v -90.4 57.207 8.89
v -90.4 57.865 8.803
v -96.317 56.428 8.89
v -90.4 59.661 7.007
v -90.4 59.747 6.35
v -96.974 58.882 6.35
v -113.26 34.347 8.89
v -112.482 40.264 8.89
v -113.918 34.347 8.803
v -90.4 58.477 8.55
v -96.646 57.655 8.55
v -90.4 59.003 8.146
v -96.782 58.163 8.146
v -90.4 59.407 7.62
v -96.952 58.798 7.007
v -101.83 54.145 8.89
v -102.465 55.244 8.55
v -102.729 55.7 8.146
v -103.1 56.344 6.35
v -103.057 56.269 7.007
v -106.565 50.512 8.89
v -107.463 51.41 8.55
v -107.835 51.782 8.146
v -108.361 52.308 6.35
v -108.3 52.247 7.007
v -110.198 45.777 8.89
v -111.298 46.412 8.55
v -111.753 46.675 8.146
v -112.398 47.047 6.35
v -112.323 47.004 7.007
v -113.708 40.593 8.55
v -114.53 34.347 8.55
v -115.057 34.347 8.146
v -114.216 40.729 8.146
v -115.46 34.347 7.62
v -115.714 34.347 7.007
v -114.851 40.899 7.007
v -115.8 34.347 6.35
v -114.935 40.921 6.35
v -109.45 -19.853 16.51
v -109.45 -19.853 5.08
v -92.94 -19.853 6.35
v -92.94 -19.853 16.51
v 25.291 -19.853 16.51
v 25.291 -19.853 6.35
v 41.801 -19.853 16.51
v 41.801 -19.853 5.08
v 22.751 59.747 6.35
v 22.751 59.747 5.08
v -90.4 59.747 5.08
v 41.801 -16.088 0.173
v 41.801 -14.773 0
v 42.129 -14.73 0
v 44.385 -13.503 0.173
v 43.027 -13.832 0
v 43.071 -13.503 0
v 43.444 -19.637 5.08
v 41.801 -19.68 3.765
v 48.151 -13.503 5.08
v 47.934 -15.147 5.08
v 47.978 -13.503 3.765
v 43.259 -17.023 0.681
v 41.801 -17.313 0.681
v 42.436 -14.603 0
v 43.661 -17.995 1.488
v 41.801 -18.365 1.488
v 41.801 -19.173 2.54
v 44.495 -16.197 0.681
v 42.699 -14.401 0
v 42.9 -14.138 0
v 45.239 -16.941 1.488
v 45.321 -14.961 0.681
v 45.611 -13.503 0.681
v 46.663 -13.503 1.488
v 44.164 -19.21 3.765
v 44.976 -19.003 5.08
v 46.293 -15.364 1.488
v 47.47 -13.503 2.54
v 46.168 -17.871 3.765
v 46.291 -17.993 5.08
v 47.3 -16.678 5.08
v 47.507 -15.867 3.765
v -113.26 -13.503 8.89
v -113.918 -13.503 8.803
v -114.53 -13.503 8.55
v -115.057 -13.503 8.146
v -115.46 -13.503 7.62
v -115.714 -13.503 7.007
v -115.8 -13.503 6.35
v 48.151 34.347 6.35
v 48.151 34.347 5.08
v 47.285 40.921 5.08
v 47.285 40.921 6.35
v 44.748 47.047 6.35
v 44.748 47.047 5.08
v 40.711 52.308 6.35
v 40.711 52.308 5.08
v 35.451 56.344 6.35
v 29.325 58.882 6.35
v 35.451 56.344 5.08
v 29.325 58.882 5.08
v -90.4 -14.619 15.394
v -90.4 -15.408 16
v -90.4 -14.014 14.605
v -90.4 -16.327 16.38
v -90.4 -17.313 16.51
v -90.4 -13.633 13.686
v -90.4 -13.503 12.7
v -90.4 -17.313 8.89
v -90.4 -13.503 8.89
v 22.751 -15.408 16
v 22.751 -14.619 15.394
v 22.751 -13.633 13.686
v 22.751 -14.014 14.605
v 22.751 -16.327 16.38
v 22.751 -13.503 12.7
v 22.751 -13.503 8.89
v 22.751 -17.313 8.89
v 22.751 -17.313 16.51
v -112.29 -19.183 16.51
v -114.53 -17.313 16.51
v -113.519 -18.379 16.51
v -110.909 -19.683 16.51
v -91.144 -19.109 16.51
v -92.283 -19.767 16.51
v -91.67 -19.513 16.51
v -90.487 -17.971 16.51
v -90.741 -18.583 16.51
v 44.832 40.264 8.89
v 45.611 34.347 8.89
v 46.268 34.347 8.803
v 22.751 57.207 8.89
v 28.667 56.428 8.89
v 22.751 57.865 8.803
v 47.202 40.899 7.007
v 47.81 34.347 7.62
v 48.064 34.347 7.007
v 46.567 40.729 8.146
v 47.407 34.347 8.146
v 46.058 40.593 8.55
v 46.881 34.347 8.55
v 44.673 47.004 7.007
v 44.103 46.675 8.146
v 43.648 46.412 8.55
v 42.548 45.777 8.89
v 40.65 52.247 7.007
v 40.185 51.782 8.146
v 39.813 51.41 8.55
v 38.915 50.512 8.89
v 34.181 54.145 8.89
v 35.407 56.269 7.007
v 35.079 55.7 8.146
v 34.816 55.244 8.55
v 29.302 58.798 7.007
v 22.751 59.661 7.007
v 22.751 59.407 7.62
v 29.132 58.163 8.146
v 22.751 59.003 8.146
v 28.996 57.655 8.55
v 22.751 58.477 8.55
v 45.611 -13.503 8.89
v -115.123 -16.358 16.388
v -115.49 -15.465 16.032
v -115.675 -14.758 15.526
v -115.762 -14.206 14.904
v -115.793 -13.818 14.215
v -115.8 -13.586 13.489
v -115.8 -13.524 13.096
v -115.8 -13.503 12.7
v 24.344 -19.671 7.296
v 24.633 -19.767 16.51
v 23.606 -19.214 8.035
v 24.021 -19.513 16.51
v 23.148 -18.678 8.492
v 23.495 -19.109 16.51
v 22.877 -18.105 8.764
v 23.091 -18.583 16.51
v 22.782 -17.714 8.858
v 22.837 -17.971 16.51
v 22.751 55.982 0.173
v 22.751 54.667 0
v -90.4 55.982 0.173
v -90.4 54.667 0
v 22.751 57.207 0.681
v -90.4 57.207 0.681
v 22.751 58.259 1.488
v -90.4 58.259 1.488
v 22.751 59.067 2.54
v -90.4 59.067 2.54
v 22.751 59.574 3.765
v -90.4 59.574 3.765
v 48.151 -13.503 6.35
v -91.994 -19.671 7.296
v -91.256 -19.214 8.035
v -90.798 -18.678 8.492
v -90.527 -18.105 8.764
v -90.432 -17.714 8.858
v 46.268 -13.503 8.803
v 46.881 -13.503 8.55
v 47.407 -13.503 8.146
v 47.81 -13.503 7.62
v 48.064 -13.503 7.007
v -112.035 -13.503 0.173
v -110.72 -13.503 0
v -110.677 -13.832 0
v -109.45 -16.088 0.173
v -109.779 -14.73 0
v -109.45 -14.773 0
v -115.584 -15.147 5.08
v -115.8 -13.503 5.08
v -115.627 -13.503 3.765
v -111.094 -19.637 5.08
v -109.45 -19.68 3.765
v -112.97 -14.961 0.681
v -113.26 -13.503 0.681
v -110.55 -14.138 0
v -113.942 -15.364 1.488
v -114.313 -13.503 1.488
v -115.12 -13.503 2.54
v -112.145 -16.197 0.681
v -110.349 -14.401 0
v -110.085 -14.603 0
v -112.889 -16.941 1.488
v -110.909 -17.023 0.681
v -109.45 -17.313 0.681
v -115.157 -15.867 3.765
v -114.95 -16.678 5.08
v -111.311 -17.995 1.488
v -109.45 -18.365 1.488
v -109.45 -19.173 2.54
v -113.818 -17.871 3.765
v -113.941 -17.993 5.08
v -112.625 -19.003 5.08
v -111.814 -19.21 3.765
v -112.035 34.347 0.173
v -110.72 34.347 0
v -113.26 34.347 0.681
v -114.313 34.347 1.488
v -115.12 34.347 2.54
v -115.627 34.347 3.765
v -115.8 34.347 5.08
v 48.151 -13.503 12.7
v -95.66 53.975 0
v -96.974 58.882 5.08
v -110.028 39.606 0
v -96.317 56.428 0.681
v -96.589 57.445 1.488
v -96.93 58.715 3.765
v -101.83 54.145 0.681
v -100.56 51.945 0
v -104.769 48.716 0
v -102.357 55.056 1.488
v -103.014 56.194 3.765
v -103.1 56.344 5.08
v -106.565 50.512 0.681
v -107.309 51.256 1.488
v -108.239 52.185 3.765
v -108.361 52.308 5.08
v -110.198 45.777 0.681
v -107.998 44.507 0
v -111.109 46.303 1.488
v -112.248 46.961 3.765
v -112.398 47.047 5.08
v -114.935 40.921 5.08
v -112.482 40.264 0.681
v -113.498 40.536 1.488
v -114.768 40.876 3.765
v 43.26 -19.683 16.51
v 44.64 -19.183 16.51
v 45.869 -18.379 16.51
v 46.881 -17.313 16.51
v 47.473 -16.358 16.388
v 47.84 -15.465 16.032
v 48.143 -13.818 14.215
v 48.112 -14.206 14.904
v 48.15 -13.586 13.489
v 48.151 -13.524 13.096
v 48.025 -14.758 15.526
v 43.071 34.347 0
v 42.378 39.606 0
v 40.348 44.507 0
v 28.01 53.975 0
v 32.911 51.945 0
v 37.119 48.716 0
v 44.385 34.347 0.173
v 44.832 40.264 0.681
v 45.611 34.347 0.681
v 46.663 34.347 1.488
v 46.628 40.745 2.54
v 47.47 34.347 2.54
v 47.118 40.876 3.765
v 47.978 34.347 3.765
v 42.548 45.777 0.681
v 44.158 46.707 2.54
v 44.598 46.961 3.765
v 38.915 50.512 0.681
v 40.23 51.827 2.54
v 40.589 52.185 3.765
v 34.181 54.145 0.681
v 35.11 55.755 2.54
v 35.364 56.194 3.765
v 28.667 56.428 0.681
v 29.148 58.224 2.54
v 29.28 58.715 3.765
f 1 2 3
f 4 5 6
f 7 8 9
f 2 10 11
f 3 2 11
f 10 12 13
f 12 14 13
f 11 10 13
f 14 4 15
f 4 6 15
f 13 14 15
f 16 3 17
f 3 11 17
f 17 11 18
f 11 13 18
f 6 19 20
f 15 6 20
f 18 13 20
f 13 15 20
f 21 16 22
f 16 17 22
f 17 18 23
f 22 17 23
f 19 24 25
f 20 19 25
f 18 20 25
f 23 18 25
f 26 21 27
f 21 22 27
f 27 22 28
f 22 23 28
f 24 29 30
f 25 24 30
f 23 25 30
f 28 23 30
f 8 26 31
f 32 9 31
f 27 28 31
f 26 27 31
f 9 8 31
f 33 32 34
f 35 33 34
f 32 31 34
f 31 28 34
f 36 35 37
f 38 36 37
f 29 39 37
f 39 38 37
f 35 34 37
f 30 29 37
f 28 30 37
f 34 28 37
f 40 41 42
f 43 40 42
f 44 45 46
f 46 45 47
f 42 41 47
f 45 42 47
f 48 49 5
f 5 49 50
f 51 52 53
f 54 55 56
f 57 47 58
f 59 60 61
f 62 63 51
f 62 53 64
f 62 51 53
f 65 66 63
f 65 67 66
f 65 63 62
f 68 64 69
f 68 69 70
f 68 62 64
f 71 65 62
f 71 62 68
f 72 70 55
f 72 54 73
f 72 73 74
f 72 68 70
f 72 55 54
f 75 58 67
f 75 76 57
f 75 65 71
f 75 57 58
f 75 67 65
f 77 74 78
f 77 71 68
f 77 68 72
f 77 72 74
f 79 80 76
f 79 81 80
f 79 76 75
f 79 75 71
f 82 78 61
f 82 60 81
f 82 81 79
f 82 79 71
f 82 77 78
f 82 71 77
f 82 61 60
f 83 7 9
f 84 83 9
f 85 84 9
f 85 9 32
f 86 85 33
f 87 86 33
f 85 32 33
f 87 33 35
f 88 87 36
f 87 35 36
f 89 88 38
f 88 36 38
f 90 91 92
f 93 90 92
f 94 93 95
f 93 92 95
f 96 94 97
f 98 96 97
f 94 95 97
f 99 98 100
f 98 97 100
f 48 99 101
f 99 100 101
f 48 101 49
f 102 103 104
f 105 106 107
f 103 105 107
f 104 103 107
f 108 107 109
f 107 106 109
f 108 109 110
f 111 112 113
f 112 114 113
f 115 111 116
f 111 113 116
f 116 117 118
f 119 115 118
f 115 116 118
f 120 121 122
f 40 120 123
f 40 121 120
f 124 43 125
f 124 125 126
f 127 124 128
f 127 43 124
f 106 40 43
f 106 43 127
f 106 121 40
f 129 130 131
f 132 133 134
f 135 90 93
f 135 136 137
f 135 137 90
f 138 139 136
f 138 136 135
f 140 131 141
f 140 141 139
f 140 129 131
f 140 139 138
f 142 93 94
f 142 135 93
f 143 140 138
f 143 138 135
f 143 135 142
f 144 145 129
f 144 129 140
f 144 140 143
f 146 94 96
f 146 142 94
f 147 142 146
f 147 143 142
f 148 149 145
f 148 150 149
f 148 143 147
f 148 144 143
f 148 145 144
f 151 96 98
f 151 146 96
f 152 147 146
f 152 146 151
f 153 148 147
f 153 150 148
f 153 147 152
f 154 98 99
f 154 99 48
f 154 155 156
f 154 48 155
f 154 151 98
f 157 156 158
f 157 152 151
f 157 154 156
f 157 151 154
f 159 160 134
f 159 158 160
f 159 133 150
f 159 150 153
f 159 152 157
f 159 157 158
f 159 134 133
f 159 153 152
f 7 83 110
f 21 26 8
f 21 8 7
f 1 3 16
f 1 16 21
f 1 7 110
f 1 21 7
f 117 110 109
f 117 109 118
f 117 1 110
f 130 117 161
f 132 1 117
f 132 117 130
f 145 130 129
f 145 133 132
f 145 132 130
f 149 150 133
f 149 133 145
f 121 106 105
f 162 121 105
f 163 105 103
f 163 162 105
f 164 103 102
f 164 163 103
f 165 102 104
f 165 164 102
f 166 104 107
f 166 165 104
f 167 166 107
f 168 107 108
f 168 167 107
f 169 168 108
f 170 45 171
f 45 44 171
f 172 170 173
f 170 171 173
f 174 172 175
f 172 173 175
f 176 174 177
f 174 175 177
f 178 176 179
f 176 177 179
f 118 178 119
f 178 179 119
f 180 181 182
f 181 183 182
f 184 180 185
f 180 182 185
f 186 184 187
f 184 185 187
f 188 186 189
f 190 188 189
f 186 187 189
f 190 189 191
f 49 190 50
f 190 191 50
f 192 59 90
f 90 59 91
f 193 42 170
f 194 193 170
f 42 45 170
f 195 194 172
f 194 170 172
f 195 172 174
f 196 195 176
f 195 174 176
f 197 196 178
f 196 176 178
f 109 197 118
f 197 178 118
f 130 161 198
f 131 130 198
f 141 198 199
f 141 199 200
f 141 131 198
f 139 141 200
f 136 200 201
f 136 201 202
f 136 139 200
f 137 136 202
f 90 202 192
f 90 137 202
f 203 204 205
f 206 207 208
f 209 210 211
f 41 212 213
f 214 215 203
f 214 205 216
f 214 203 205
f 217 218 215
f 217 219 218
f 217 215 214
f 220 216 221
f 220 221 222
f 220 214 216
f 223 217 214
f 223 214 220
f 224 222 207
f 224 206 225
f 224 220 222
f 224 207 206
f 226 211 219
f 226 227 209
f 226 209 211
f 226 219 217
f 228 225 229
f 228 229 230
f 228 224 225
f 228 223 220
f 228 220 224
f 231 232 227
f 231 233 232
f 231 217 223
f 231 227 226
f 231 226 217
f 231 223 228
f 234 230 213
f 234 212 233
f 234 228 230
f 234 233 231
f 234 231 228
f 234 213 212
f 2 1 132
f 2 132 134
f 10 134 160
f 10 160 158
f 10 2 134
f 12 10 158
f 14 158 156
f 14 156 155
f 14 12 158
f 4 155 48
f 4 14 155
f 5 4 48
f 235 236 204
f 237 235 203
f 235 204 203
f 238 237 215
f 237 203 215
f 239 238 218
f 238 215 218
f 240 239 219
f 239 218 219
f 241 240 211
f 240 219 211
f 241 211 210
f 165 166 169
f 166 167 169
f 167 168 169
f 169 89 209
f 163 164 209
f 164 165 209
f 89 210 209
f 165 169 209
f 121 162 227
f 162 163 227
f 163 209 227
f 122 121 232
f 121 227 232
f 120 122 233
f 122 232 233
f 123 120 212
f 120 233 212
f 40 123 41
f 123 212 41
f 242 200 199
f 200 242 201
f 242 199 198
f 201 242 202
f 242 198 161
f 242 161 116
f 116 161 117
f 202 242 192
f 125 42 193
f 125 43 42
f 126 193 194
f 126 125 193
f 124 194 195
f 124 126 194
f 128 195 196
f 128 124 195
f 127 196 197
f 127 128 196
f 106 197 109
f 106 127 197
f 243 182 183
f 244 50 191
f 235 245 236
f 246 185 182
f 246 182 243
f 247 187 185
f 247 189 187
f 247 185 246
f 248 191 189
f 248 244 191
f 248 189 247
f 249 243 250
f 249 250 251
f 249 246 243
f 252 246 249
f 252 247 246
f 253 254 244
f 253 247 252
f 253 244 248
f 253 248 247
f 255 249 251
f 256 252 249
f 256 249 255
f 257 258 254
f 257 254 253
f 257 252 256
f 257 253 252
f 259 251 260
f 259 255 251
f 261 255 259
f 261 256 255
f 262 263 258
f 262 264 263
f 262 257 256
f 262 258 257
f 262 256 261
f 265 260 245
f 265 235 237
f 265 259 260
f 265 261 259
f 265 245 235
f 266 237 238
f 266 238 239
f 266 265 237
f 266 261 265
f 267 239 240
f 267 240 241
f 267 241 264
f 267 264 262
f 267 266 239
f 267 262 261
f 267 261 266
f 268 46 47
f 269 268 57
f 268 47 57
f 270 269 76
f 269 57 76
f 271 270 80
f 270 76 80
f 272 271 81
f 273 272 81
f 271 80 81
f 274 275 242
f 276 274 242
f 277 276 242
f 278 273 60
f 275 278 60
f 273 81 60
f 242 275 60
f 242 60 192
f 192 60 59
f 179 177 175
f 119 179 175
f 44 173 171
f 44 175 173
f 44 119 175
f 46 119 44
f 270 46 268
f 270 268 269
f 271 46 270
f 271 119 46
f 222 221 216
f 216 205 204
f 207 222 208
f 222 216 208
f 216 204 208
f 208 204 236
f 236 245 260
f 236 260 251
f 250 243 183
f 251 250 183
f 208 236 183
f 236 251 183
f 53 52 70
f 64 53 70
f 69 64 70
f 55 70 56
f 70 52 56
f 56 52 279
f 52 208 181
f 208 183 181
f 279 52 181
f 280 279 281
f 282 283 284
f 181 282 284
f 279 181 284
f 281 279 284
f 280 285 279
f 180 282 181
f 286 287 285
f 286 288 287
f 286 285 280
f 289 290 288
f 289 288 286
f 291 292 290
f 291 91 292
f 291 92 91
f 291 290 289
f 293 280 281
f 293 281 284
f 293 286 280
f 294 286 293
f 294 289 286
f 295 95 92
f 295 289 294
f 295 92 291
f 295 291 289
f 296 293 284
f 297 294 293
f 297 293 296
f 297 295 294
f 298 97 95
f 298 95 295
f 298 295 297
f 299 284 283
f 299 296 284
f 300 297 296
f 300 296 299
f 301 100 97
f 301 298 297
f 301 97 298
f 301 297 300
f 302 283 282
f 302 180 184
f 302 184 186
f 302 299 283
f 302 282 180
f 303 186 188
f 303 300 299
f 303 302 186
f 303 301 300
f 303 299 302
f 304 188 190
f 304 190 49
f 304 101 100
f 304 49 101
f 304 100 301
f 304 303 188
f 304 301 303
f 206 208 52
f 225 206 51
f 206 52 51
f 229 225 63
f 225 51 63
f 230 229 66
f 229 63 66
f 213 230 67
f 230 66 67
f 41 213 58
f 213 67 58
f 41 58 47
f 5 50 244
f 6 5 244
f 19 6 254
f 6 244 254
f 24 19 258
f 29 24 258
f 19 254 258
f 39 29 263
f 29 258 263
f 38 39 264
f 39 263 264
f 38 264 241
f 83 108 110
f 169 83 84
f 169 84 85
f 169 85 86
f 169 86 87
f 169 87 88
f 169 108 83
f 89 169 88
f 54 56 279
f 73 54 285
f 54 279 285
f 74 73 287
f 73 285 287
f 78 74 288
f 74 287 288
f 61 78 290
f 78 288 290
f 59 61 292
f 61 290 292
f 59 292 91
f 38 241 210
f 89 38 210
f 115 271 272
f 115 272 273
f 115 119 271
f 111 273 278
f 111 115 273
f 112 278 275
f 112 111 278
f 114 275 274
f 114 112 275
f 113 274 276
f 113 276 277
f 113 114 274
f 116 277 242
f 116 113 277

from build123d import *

# Parameters (mm, degrees)
F1_DEPTH    = 8.89
F3_DEPTH    = 7.62
F4_T1_DEPTH = 47.8505725861
F4_T3_DEPTH = 113.1511068404
F4_T6_ANGLE = 90
F4_T8_ANGLE = 90
F5_R        = 5.08
F6_R        = 3.81
F7_R        = 2.54


# Not quite as in the source:
# - a fillet or chamfer that OpenCascade refuses, or shapes differently, is made with other operations: its cross-section is extruded or revolved along the edge and cut away or added


with BuildPart() as f1:
    # F0 (on Top) → F1 (new body)
    with BuildSketch(Plane.XY):
        with BuildLine():
            Line((22.7506106496, 59.7472505152), (-90.4004961908, 59.7472505152))
            ThreePointArc((-90.4004961908, 59.7472505152), (-108.3610084329, 52.3077627574), (-115.8004961908, 34.3472505152))
            Line((-115.8004961908, 34.3472505152), (-115.8004961908, -13.5033220708))
            ThreePointArc((-115.8004961908, -13.5033220708), (-113.9406242513, -17.9934501314), (-109.4504961908, -19.8533220708))
            Line((-109.4504961908, -19.8533220708), (41.8006106496, -19.8533220708))
            ThreePointArc((41.8006106496, -19.8533220708), (46.2907387101, -17.9934501314), (48.1506106496, -13.5033220708))
            Line((48.1506106496, -13.5033220708), (48.1506106496, 34.3472505152))
            ThreePointArc((48.1506106496, 34.3472505152), (40.7111228917, 52.3077627574), (22.7506106496, 59.7472505152))
        make_face()
    extrude(amount=F1_DEPTH)

    # F2 (on face) → F3 (join)
    with BuildSketch(Plane.XY.offset(8.89)):
        with BuildLine():
            ThreePointArc((41.8006106496, -19.8533220708), (46.2907387101, -17.9934501314), (48.1506106496, -13.5033220708))
            Line((48.1506106496, -13.5033220708), (22.7506106496, -13.5033220708))
            Line((22.7506106496, -13.5033220708), (22.7506106496, -19.8533220708))
            Line((22.7506106496, -19.8533220708), (41.8006106496, -19.8533220708))
        make_face()
        with BuildLine():
            Line((-90.4004961908, -13.5033220708), (-115.8004961908, -13.5033220708))
            ThreePointArc((-115.8004961908, -13.5033220708), (-113.9406242513, -17.9934501314), (-109.4504961908, -19.8533220708))
            Line((-109.4504961908, -19.8533220708), (-90.4004961908, -19.8533220708))
            Line((-90.4004961908, -19.8533220708), (-90.4004961908, -13.5033220708))
        make_face()
    extrude(amount=F3_DEPTH)

    # F4: fillet of radius 2.54 on 1 edges, made by hand

    # F4_s2 → F4_t1 (cut)
    with BuildSketch(Plane.XZ.offset(-34.3472505152)):
        with BuildLine():
            ThreePointArc((45.6106106496, 8.89), (47.4066618738, 8.1460512242), (48.1506106496, 6.35))
            Line((48.1506106496, 6.35), (48.1506106496, 8.89))
            Line((48.1506106496, 8.89), (45.6106106496, 8.89))
        make_face()
        with BuildLine():
            ThreePointArc((-113.2604961908, 8.89), (-115.056547415, 8.1460512242), (-115.8004961908, 6.35))
            Line((-115.8004961908, 6.35), (-115.8004961908, 8.89))
            Line((-115.8004961908, 8.89), (-113.2604961908, 8.89))
        make_face()
    extrude(amount=F4_T1_DEPTH, mode=Mode.SUBTRACT)

    # F4_s4 → F4_t3 (cut)
    with BuildSketch(Plane.YZ.offset(-90.4004961908)):
        with BuildLine():
            ThreePointArc((57.2072505152, 8.89), (59.0033017394, 8.1460512242), (59.7472505152, 6.35))
            Line((59.7472505152, 6.35), (59.7472505152, 8.89))
            Line((59.7472505152, 8.89), (57.2072505152, 8.89))
        make_face()
    extrude(amount=F4_T3_DEPTH, mode=Mode.SUBTRACT)

    # F4_s5 → F4_t6 (revolve, cut)
    with BuildSketch(Plane.XZ.offset(-34.3472505152)):
        with BuildLine():
            ThreePointArc((48.1506106496, 6.35), (47.4066618738, 8.1460512242), (45.6106106496, 8.89))
            Line((45.6106106496, 8.89), (48.1506106496, 8.89))
            Line((48.1506106496, 8.89), (48.1506106496, 6.35))
        make_face()
    revolve(axis=Axis((22.7506106496, 34.3472505152, 8.89), (0, 0, 1)), revolution_arc=F4_T6_ANGLE, mode=Mode.SUBTRACT)

    # F4_s7 → F4_t8 (revolve, cut)
    with BuildSketch(Plane.YZ.offset(-90.4004961908)):
        with BuildLine():
            ThreePointArc((57.2072505152, 8.89), (59.0033017394, 8.1460512242), (59.7472505152, 6.35))
            Line((59.7472505152, 6.35), (59.7472505152, 8.89))
            Line((59.7472505152, 8.89), (57.2072505152, 8.89))
        make_face()
    revolve(axis=Axis((-90.4004961908, 34.3472505152, 8.89), (0, 0, 1)), revolution_arc=F4_T8_ANGLE, mode=Mode.SUBTRACT)

    # F5
    f5_edges = [f1.edges().sort_by_distance(p)[0] for p in [
        (-33.824943, 59.747251, 0),
    ]]
    fillet(f5_edges, radius=F5_R)

    # F6
    f6_edges = [f1.edges().sort_by_distance(p)[0] for p in [
        (35.450611, -13.503322, 16.51),
        (-103.100496, -13.503322, 16.51),
    ]]
    fillet(f6_edges, radius=F6_R)

    # F7
    f7_edges = [f1.edges().sort_by_distance(p)[0] for p in [
        (-90.400496, -19.853322, 12.7),
        (-33.824943, -19.853322, 8.89),
        (22.750611, -19.853322, 12.7),
    ]]
    fillet(f7_edges, radius=F7_R)


solid = f1.part
